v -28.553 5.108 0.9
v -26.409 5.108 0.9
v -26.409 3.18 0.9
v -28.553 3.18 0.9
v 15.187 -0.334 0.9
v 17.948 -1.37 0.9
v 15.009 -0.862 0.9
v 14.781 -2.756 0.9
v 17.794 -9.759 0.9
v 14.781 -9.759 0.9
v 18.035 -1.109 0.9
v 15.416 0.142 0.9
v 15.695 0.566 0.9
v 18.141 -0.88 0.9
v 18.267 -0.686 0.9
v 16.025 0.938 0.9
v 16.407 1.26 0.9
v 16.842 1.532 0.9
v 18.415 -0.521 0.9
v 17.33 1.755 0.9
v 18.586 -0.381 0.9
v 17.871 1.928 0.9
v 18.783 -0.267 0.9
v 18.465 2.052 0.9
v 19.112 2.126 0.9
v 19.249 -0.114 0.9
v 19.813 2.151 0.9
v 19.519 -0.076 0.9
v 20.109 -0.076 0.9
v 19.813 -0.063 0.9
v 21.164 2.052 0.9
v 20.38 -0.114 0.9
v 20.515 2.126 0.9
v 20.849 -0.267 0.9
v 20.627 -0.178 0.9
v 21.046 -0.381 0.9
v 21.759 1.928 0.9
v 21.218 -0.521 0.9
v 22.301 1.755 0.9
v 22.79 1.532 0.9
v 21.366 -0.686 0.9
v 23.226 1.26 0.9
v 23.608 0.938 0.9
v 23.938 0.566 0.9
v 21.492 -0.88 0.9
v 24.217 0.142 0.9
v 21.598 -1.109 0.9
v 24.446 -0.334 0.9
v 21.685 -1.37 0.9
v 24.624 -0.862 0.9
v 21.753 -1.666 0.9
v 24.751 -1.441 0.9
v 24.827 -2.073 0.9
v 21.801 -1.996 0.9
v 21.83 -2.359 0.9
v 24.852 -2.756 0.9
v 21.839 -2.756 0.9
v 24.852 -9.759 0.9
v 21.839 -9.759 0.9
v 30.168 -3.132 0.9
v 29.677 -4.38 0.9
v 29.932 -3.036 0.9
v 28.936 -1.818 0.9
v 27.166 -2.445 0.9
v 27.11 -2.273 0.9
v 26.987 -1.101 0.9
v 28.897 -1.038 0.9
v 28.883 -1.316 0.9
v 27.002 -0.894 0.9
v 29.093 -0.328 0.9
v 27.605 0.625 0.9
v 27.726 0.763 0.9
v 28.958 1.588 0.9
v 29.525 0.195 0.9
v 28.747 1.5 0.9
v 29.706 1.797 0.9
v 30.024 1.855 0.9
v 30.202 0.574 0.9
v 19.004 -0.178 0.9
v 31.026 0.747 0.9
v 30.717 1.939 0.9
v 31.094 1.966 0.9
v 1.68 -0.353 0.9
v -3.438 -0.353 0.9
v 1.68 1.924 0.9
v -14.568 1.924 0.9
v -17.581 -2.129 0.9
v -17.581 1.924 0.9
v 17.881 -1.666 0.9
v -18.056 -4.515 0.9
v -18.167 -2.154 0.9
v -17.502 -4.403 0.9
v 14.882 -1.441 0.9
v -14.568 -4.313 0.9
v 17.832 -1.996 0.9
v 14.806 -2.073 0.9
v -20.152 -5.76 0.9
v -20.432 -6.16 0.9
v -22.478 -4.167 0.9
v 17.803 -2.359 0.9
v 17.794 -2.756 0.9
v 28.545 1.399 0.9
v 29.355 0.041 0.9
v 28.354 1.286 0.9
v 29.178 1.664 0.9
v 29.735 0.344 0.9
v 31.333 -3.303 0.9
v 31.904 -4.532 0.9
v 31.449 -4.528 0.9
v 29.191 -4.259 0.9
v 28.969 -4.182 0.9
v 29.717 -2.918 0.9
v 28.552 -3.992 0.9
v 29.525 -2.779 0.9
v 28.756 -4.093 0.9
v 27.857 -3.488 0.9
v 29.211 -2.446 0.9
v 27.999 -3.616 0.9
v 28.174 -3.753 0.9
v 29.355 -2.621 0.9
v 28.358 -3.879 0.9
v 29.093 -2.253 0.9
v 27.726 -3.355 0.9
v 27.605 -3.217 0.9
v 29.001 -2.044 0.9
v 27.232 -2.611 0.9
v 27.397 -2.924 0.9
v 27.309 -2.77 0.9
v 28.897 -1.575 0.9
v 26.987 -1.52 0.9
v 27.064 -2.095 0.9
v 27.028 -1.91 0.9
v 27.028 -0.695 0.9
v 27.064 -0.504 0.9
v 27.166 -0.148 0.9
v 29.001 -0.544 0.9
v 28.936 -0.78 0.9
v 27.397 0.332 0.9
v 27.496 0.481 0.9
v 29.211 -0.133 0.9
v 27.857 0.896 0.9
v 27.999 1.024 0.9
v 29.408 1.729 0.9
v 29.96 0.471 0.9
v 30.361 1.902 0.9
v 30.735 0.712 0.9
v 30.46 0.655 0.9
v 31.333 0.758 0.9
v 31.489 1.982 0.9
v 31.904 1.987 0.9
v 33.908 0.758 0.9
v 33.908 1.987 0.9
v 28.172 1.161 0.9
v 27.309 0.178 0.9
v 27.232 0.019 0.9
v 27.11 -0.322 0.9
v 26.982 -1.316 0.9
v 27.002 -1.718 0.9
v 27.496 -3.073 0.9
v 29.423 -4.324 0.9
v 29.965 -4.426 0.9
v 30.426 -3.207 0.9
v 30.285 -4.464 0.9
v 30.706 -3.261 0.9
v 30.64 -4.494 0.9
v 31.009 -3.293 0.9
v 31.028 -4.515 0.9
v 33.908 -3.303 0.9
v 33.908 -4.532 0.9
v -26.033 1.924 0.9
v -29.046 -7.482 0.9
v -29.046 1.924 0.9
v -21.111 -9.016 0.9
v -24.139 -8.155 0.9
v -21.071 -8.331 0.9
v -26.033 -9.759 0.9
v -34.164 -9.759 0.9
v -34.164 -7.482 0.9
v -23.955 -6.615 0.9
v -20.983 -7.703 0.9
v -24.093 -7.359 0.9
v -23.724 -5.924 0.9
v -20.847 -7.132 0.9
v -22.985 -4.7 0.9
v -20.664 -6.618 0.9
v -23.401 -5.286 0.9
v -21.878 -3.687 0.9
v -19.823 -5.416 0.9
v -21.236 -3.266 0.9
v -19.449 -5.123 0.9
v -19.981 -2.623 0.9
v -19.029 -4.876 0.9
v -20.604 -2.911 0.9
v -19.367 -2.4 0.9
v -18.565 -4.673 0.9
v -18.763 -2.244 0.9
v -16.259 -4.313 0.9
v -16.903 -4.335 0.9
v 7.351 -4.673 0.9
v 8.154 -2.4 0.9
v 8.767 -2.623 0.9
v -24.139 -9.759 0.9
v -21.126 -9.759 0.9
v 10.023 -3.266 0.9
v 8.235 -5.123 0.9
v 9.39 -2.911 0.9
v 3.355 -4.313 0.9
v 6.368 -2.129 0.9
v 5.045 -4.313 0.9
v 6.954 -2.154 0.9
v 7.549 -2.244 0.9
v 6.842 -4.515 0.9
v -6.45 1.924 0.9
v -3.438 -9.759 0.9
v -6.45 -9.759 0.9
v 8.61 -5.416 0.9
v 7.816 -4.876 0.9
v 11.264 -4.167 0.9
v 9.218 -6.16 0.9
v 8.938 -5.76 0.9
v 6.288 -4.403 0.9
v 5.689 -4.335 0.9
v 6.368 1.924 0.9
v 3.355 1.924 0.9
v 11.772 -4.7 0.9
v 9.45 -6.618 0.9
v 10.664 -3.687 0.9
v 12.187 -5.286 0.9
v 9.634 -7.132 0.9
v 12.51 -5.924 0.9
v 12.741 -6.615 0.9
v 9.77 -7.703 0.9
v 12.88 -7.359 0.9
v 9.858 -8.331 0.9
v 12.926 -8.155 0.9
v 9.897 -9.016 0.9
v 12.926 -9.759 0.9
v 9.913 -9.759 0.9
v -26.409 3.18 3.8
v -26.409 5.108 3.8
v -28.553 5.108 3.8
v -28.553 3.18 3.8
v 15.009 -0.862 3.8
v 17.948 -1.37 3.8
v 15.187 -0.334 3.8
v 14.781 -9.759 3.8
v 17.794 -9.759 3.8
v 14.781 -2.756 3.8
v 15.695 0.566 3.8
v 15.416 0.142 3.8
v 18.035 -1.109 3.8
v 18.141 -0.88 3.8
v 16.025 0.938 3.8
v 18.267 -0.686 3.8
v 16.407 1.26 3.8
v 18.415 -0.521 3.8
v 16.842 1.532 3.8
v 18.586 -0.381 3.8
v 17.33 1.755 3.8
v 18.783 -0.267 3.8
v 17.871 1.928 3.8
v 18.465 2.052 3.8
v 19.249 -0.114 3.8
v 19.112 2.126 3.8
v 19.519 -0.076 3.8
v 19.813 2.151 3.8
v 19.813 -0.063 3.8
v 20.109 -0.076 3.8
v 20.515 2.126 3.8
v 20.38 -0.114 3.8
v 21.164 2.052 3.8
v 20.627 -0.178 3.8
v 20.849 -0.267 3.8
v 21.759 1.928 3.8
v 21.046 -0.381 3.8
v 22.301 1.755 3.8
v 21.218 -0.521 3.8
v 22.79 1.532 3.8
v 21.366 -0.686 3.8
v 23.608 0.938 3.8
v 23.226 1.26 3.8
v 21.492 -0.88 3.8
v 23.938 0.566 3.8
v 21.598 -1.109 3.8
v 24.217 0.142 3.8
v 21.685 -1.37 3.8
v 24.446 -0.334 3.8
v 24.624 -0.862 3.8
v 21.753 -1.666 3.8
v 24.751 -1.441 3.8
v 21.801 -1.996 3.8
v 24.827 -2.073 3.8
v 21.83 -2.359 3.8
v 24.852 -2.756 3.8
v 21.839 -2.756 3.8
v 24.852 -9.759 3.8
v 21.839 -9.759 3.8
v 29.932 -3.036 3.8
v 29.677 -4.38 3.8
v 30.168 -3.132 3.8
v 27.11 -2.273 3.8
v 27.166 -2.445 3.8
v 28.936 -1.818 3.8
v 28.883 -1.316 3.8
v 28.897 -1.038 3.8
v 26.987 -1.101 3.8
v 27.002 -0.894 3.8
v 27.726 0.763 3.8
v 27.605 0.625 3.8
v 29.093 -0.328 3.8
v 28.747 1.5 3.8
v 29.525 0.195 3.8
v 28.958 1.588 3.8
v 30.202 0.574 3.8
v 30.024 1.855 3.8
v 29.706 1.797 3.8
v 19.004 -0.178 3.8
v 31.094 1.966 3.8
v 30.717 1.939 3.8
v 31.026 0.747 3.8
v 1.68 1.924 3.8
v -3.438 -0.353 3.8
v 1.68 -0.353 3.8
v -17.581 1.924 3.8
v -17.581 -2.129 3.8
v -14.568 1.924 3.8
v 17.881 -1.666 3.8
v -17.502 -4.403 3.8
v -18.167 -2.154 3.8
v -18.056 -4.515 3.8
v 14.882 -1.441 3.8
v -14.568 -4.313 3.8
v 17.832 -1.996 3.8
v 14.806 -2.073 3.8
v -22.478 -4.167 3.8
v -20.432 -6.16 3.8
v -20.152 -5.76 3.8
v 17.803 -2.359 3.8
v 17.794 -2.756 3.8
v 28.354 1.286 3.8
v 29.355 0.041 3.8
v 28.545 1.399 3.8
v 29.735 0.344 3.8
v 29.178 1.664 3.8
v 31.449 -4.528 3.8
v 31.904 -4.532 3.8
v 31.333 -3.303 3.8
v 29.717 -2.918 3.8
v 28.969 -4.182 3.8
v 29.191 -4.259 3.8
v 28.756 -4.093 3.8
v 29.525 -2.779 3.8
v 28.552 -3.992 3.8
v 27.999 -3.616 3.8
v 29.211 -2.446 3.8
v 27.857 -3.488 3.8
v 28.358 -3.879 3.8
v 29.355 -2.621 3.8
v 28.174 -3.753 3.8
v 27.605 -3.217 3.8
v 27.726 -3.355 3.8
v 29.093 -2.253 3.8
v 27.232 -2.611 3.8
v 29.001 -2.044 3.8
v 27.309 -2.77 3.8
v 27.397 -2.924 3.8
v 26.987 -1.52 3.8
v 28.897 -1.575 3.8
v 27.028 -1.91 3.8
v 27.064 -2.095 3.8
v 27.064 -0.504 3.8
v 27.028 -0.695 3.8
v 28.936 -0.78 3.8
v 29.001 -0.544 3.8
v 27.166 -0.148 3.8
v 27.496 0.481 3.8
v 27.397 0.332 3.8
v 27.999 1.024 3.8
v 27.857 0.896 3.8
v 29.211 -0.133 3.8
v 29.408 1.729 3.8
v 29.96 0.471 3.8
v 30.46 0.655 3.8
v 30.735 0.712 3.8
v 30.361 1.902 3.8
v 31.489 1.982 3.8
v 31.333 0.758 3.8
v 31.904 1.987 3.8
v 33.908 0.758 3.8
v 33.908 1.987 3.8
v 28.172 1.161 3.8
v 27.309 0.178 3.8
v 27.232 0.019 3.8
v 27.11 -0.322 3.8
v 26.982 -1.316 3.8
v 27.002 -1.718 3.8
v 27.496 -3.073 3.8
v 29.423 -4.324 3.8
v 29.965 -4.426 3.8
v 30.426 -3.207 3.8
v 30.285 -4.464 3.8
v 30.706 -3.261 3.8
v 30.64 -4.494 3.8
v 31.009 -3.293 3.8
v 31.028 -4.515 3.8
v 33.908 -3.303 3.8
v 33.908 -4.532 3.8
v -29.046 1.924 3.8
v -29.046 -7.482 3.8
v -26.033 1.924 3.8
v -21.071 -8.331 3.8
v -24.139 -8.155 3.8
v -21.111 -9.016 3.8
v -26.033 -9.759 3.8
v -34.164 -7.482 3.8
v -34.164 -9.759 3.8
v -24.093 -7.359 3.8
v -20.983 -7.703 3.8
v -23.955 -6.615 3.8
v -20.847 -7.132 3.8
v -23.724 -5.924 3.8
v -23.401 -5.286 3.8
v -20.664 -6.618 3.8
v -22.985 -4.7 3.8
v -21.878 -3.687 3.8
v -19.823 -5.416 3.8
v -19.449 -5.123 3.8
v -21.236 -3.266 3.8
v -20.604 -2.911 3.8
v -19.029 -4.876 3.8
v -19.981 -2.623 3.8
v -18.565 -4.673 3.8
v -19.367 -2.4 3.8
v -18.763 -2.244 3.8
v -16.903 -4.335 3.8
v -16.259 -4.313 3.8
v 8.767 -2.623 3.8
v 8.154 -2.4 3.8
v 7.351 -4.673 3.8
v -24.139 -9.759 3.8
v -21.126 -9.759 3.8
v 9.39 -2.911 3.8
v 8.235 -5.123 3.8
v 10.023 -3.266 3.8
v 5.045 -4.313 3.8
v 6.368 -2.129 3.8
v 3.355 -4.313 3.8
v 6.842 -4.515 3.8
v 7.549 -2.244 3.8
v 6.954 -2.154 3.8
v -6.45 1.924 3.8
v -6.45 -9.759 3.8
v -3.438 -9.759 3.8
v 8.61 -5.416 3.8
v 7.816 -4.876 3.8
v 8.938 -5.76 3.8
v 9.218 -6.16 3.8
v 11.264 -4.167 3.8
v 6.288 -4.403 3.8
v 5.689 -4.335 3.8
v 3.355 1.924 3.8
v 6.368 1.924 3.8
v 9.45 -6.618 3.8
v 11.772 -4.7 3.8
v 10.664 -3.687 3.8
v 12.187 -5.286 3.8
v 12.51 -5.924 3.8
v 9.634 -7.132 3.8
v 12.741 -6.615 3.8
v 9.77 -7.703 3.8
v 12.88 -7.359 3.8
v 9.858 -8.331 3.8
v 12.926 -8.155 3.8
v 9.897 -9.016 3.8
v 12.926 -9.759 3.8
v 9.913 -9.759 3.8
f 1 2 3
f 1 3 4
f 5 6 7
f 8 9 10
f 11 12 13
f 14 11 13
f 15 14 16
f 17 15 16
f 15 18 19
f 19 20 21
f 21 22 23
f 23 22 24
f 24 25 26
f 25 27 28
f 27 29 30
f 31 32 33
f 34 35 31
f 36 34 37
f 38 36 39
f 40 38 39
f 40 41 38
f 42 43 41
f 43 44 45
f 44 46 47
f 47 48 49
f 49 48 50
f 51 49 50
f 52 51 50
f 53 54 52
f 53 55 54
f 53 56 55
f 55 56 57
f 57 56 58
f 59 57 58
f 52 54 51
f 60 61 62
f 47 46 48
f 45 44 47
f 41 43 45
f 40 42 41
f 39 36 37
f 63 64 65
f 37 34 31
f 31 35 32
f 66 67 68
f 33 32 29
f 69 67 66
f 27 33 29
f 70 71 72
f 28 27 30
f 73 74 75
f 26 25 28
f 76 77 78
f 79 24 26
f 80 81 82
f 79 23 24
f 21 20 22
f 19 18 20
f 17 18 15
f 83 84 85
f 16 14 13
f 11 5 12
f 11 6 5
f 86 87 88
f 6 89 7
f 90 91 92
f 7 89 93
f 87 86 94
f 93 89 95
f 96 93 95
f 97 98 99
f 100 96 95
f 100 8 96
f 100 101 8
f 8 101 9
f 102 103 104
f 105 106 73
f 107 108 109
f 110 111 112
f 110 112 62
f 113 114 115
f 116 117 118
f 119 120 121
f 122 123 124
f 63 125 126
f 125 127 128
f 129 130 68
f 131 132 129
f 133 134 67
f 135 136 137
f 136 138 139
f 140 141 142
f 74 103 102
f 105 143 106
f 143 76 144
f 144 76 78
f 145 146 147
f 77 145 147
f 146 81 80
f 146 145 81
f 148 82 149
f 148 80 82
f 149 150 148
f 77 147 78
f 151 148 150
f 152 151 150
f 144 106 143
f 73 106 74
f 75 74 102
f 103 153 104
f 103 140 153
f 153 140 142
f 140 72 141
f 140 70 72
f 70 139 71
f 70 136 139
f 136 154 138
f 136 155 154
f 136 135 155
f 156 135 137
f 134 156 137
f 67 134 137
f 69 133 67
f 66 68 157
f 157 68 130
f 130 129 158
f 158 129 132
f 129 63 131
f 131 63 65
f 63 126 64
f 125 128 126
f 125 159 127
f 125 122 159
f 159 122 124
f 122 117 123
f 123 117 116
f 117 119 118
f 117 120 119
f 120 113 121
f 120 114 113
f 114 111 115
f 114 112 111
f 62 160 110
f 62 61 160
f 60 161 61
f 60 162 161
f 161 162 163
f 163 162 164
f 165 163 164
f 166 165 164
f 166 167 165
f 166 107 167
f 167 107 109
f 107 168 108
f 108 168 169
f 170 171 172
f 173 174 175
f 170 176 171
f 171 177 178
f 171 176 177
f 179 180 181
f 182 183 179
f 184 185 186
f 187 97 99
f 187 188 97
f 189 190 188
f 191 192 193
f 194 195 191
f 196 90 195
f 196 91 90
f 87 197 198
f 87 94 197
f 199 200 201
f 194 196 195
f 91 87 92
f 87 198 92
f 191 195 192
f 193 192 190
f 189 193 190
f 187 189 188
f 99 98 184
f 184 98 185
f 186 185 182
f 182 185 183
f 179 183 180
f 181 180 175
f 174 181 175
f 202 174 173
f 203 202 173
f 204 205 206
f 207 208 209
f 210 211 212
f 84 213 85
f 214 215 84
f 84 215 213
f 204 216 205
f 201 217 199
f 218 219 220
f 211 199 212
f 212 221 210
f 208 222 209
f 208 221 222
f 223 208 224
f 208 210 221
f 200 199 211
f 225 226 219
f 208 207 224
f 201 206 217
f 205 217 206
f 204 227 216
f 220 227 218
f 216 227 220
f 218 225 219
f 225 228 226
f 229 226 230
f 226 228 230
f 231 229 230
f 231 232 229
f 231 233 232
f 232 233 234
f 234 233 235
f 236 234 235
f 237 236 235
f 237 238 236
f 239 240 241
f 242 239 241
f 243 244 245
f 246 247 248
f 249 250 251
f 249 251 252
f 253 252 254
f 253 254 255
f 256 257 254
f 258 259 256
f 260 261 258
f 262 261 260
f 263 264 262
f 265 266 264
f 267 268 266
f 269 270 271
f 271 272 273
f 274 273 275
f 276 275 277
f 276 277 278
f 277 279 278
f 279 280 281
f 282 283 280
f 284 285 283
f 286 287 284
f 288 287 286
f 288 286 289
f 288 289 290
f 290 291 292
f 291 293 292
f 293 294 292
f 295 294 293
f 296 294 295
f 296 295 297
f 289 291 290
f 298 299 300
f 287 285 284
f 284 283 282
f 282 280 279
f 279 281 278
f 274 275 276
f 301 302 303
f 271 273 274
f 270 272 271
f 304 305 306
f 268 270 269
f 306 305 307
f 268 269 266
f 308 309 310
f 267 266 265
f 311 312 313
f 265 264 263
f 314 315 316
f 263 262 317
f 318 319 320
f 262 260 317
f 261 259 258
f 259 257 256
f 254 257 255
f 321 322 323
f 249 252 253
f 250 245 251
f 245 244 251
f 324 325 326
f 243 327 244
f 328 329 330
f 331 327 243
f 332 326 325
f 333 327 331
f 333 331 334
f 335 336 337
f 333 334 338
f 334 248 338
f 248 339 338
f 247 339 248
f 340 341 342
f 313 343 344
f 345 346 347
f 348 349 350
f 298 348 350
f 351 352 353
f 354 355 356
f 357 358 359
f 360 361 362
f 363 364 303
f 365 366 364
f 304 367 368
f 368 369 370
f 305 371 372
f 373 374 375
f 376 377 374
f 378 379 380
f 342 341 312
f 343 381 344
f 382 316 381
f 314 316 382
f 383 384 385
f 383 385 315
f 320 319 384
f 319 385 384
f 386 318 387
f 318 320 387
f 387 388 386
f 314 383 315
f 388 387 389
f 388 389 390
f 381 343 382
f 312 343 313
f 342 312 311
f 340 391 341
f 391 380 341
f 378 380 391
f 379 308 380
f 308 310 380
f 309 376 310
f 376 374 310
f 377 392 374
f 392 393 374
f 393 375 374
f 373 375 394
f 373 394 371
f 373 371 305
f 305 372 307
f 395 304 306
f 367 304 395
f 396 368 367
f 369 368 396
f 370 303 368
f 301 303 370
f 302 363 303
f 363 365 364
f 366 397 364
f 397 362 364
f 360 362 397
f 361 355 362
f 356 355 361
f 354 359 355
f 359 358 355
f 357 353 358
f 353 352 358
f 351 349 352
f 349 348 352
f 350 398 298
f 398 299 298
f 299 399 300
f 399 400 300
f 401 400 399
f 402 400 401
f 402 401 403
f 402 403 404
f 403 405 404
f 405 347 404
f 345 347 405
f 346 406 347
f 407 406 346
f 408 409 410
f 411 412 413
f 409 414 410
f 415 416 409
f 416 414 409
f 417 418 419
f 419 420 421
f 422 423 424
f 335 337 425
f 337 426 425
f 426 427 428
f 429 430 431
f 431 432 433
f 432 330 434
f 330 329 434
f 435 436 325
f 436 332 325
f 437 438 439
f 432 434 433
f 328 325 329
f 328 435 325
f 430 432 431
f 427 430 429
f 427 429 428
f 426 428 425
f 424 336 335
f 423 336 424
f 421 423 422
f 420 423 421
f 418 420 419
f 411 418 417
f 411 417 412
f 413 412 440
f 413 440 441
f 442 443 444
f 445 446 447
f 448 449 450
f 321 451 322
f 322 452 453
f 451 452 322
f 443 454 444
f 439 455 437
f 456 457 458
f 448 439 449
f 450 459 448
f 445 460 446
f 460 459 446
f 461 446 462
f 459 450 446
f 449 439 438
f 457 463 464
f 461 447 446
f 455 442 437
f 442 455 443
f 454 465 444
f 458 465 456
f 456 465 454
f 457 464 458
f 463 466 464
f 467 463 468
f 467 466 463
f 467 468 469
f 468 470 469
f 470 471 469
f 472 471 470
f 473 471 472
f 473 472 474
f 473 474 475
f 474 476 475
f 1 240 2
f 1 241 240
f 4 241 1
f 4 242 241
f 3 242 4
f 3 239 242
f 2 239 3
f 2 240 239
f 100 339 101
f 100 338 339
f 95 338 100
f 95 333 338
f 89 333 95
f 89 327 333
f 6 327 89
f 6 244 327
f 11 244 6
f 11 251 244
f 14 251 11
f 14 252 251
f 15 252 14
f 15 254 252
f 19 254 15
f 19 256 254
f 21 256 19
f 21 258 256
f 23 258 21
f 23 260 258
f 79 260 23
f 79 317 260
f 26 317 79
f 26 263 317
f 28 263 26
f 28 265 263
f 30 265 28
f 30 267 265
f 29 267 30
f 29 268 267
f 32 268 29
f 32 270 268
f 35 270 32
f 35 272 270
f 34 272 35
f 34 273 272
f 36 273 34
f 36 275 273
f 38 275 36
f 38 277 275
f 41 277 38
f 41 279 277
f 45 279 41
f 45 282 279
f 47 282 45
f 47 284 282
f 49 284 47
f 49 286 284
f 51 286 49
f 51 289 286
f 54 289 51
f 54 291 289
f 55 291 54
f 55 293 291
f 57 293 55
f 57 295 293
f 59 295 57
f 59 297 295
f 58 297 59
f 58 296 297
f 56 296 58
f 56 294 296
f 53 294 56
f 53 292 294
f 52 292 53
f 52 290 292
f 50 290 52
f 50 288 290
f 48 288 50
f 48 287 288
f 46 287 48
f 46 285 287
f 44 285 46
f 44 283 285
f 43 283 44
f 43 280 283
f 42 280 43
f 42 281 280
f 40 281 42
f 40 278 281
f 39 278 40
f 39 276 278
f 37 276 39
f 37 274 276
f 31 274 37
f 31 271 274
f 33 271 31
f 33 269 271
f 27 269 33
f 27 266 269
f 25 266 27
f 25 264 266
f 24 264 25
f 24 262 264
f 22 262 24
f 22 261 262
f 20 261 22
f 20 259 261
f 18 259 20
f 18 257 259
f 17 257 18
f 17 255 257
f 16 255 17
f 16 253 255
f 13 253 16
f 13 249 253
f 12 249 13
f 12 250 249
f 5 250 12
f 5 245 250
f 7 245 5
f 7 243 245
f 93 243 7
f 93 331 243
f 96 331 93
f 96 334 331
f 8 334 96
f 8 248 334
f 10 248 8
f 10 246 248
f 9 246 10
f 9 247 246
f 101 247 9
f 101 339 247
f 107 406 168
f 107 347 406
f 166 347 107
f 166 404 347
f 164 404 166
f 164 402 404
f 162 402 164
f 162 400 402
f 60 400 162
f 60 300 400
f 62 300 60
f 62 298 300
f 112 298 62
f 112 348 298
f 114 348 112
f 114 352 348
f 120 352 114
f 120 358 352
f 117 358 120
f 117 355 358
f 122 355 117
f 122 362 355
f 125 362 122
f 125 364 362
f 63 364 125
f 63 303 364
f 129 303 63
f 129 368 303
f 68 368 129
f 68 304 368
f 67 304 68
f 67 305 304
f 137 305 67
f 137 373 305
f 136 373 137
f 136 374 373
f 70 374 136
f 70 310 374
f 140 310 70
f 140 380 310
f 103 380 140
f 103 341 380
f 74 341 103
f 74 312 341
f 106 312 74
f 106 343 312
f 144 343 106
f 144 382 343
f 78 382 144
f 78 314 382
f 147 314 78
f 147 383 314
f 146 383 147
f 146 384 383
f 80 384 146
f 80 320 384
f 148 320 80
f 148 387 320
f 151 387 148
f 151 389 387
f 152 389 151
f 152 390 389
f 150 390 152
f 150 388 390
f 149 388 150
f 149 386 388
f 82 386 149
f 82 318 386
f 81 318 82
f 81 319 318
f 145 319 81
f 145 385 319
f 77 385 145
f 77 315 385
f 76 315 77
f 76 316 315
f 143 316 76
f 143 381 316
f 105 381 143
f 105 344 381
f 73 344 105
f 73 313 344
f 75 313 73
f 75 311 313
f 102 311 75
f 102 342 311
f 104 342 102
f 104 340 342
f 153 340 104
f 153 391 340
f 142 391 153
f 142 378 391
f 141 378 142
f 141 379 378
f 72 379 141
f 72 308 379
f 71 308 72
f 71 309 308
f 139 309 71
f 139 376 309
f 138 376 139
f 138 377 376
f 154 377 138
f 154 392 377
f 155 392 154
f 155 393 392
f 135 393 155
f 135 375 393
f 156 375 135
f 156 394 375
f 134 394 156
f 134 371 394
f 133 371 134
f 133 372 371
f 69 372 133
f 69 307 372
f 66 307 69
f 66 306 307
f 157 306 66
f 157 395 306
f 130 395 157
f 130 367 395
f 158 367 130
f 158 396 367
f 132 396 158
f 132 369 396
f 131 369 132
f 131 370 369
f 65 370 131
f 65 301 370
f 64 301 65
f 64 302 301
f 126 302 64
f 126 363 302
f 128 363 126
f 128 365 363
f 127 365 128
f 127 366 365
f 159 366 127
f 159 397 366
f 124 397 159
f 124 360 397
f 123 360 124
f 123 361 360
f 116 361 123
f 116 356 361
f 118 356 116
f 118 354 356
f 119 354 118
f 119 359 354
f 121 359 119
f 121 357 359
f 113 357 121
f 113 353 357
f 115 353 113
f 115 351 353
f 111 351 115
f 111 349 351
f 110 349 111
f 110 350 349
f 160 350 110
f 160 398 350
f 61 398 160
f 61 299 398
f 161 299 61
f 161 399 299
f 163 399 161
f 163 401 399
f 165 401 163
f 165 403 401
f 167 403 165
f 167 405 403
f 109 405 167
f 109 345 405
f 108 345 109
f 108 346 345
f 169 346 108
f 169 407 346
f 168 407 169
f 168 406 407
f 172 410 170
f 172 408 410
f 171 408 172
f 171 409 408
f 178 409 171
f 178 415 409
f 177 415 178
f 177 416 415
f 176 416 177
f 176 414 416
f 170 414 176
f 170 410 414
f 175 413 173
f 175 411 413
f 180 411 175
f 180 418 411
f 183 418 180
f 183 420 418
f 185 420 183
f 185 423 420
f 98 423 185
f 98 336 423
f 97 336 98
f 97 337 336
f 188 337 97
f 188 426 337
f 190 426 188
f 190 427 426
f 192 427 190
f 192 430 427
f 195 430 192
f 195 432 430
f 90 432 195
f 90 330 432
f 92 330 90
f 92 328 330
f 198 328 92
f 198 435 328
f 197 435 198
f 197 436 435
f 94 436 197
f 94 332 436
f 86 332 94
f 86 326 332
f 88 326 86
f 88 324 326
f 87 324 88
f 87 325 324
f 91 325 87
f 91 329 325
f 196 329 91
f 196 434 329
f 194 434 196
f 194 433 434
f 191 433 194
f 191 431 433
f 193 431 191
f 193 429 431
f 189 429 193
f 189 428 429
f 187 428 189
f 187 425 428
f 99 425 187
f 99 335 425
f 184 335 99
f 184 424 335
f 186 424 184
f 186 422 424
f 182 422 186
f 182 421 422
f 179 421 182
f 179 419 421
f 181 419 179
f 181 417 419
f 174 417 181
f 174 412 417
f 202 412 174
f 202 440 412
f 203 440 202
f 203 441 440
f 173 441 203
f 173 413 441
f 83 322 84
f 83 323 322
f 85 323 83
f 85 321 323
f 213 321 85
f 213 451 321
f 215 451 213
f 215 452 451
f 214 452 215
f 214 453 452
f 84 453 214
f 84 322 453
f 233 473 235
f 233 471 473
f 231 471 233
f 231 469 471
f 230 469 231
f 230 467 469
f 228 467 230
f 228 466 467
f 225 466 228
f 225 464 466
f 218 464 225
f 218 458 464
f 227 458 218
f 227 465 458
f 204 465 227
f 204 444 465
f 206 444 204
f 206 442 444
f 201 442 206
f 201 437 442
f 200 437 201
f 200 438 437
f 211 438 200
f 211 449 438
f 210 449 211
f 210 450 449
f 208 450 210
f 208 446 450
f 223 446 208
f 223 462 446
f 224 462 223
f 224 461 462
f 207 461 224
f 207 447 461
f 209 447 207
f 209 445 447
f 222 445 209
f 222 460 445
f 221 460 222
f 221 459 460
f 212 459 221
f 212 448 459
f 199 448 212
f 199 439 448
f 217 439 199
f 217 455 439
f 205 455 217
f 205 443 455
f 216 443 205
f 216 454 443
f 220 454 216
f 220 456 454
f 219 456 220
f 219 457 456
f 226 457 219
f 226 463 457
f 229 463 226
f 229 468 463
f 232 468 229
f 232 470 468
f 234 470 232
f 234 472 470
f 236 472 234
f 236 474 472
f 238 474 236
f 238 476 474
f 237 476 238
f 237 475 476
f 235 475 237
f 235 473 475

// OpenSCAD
$fn = 48;
  // syllabics (overlaid on icon, tallest)
  translate([0, -2.500, 0.900]) linear_extrude(height=2.900) text("ᒨᓱ ᒥᓴᑎᒼ", size=11.540, halign="center", valign="center", font="Euphemia UCAS:style=Bold");
